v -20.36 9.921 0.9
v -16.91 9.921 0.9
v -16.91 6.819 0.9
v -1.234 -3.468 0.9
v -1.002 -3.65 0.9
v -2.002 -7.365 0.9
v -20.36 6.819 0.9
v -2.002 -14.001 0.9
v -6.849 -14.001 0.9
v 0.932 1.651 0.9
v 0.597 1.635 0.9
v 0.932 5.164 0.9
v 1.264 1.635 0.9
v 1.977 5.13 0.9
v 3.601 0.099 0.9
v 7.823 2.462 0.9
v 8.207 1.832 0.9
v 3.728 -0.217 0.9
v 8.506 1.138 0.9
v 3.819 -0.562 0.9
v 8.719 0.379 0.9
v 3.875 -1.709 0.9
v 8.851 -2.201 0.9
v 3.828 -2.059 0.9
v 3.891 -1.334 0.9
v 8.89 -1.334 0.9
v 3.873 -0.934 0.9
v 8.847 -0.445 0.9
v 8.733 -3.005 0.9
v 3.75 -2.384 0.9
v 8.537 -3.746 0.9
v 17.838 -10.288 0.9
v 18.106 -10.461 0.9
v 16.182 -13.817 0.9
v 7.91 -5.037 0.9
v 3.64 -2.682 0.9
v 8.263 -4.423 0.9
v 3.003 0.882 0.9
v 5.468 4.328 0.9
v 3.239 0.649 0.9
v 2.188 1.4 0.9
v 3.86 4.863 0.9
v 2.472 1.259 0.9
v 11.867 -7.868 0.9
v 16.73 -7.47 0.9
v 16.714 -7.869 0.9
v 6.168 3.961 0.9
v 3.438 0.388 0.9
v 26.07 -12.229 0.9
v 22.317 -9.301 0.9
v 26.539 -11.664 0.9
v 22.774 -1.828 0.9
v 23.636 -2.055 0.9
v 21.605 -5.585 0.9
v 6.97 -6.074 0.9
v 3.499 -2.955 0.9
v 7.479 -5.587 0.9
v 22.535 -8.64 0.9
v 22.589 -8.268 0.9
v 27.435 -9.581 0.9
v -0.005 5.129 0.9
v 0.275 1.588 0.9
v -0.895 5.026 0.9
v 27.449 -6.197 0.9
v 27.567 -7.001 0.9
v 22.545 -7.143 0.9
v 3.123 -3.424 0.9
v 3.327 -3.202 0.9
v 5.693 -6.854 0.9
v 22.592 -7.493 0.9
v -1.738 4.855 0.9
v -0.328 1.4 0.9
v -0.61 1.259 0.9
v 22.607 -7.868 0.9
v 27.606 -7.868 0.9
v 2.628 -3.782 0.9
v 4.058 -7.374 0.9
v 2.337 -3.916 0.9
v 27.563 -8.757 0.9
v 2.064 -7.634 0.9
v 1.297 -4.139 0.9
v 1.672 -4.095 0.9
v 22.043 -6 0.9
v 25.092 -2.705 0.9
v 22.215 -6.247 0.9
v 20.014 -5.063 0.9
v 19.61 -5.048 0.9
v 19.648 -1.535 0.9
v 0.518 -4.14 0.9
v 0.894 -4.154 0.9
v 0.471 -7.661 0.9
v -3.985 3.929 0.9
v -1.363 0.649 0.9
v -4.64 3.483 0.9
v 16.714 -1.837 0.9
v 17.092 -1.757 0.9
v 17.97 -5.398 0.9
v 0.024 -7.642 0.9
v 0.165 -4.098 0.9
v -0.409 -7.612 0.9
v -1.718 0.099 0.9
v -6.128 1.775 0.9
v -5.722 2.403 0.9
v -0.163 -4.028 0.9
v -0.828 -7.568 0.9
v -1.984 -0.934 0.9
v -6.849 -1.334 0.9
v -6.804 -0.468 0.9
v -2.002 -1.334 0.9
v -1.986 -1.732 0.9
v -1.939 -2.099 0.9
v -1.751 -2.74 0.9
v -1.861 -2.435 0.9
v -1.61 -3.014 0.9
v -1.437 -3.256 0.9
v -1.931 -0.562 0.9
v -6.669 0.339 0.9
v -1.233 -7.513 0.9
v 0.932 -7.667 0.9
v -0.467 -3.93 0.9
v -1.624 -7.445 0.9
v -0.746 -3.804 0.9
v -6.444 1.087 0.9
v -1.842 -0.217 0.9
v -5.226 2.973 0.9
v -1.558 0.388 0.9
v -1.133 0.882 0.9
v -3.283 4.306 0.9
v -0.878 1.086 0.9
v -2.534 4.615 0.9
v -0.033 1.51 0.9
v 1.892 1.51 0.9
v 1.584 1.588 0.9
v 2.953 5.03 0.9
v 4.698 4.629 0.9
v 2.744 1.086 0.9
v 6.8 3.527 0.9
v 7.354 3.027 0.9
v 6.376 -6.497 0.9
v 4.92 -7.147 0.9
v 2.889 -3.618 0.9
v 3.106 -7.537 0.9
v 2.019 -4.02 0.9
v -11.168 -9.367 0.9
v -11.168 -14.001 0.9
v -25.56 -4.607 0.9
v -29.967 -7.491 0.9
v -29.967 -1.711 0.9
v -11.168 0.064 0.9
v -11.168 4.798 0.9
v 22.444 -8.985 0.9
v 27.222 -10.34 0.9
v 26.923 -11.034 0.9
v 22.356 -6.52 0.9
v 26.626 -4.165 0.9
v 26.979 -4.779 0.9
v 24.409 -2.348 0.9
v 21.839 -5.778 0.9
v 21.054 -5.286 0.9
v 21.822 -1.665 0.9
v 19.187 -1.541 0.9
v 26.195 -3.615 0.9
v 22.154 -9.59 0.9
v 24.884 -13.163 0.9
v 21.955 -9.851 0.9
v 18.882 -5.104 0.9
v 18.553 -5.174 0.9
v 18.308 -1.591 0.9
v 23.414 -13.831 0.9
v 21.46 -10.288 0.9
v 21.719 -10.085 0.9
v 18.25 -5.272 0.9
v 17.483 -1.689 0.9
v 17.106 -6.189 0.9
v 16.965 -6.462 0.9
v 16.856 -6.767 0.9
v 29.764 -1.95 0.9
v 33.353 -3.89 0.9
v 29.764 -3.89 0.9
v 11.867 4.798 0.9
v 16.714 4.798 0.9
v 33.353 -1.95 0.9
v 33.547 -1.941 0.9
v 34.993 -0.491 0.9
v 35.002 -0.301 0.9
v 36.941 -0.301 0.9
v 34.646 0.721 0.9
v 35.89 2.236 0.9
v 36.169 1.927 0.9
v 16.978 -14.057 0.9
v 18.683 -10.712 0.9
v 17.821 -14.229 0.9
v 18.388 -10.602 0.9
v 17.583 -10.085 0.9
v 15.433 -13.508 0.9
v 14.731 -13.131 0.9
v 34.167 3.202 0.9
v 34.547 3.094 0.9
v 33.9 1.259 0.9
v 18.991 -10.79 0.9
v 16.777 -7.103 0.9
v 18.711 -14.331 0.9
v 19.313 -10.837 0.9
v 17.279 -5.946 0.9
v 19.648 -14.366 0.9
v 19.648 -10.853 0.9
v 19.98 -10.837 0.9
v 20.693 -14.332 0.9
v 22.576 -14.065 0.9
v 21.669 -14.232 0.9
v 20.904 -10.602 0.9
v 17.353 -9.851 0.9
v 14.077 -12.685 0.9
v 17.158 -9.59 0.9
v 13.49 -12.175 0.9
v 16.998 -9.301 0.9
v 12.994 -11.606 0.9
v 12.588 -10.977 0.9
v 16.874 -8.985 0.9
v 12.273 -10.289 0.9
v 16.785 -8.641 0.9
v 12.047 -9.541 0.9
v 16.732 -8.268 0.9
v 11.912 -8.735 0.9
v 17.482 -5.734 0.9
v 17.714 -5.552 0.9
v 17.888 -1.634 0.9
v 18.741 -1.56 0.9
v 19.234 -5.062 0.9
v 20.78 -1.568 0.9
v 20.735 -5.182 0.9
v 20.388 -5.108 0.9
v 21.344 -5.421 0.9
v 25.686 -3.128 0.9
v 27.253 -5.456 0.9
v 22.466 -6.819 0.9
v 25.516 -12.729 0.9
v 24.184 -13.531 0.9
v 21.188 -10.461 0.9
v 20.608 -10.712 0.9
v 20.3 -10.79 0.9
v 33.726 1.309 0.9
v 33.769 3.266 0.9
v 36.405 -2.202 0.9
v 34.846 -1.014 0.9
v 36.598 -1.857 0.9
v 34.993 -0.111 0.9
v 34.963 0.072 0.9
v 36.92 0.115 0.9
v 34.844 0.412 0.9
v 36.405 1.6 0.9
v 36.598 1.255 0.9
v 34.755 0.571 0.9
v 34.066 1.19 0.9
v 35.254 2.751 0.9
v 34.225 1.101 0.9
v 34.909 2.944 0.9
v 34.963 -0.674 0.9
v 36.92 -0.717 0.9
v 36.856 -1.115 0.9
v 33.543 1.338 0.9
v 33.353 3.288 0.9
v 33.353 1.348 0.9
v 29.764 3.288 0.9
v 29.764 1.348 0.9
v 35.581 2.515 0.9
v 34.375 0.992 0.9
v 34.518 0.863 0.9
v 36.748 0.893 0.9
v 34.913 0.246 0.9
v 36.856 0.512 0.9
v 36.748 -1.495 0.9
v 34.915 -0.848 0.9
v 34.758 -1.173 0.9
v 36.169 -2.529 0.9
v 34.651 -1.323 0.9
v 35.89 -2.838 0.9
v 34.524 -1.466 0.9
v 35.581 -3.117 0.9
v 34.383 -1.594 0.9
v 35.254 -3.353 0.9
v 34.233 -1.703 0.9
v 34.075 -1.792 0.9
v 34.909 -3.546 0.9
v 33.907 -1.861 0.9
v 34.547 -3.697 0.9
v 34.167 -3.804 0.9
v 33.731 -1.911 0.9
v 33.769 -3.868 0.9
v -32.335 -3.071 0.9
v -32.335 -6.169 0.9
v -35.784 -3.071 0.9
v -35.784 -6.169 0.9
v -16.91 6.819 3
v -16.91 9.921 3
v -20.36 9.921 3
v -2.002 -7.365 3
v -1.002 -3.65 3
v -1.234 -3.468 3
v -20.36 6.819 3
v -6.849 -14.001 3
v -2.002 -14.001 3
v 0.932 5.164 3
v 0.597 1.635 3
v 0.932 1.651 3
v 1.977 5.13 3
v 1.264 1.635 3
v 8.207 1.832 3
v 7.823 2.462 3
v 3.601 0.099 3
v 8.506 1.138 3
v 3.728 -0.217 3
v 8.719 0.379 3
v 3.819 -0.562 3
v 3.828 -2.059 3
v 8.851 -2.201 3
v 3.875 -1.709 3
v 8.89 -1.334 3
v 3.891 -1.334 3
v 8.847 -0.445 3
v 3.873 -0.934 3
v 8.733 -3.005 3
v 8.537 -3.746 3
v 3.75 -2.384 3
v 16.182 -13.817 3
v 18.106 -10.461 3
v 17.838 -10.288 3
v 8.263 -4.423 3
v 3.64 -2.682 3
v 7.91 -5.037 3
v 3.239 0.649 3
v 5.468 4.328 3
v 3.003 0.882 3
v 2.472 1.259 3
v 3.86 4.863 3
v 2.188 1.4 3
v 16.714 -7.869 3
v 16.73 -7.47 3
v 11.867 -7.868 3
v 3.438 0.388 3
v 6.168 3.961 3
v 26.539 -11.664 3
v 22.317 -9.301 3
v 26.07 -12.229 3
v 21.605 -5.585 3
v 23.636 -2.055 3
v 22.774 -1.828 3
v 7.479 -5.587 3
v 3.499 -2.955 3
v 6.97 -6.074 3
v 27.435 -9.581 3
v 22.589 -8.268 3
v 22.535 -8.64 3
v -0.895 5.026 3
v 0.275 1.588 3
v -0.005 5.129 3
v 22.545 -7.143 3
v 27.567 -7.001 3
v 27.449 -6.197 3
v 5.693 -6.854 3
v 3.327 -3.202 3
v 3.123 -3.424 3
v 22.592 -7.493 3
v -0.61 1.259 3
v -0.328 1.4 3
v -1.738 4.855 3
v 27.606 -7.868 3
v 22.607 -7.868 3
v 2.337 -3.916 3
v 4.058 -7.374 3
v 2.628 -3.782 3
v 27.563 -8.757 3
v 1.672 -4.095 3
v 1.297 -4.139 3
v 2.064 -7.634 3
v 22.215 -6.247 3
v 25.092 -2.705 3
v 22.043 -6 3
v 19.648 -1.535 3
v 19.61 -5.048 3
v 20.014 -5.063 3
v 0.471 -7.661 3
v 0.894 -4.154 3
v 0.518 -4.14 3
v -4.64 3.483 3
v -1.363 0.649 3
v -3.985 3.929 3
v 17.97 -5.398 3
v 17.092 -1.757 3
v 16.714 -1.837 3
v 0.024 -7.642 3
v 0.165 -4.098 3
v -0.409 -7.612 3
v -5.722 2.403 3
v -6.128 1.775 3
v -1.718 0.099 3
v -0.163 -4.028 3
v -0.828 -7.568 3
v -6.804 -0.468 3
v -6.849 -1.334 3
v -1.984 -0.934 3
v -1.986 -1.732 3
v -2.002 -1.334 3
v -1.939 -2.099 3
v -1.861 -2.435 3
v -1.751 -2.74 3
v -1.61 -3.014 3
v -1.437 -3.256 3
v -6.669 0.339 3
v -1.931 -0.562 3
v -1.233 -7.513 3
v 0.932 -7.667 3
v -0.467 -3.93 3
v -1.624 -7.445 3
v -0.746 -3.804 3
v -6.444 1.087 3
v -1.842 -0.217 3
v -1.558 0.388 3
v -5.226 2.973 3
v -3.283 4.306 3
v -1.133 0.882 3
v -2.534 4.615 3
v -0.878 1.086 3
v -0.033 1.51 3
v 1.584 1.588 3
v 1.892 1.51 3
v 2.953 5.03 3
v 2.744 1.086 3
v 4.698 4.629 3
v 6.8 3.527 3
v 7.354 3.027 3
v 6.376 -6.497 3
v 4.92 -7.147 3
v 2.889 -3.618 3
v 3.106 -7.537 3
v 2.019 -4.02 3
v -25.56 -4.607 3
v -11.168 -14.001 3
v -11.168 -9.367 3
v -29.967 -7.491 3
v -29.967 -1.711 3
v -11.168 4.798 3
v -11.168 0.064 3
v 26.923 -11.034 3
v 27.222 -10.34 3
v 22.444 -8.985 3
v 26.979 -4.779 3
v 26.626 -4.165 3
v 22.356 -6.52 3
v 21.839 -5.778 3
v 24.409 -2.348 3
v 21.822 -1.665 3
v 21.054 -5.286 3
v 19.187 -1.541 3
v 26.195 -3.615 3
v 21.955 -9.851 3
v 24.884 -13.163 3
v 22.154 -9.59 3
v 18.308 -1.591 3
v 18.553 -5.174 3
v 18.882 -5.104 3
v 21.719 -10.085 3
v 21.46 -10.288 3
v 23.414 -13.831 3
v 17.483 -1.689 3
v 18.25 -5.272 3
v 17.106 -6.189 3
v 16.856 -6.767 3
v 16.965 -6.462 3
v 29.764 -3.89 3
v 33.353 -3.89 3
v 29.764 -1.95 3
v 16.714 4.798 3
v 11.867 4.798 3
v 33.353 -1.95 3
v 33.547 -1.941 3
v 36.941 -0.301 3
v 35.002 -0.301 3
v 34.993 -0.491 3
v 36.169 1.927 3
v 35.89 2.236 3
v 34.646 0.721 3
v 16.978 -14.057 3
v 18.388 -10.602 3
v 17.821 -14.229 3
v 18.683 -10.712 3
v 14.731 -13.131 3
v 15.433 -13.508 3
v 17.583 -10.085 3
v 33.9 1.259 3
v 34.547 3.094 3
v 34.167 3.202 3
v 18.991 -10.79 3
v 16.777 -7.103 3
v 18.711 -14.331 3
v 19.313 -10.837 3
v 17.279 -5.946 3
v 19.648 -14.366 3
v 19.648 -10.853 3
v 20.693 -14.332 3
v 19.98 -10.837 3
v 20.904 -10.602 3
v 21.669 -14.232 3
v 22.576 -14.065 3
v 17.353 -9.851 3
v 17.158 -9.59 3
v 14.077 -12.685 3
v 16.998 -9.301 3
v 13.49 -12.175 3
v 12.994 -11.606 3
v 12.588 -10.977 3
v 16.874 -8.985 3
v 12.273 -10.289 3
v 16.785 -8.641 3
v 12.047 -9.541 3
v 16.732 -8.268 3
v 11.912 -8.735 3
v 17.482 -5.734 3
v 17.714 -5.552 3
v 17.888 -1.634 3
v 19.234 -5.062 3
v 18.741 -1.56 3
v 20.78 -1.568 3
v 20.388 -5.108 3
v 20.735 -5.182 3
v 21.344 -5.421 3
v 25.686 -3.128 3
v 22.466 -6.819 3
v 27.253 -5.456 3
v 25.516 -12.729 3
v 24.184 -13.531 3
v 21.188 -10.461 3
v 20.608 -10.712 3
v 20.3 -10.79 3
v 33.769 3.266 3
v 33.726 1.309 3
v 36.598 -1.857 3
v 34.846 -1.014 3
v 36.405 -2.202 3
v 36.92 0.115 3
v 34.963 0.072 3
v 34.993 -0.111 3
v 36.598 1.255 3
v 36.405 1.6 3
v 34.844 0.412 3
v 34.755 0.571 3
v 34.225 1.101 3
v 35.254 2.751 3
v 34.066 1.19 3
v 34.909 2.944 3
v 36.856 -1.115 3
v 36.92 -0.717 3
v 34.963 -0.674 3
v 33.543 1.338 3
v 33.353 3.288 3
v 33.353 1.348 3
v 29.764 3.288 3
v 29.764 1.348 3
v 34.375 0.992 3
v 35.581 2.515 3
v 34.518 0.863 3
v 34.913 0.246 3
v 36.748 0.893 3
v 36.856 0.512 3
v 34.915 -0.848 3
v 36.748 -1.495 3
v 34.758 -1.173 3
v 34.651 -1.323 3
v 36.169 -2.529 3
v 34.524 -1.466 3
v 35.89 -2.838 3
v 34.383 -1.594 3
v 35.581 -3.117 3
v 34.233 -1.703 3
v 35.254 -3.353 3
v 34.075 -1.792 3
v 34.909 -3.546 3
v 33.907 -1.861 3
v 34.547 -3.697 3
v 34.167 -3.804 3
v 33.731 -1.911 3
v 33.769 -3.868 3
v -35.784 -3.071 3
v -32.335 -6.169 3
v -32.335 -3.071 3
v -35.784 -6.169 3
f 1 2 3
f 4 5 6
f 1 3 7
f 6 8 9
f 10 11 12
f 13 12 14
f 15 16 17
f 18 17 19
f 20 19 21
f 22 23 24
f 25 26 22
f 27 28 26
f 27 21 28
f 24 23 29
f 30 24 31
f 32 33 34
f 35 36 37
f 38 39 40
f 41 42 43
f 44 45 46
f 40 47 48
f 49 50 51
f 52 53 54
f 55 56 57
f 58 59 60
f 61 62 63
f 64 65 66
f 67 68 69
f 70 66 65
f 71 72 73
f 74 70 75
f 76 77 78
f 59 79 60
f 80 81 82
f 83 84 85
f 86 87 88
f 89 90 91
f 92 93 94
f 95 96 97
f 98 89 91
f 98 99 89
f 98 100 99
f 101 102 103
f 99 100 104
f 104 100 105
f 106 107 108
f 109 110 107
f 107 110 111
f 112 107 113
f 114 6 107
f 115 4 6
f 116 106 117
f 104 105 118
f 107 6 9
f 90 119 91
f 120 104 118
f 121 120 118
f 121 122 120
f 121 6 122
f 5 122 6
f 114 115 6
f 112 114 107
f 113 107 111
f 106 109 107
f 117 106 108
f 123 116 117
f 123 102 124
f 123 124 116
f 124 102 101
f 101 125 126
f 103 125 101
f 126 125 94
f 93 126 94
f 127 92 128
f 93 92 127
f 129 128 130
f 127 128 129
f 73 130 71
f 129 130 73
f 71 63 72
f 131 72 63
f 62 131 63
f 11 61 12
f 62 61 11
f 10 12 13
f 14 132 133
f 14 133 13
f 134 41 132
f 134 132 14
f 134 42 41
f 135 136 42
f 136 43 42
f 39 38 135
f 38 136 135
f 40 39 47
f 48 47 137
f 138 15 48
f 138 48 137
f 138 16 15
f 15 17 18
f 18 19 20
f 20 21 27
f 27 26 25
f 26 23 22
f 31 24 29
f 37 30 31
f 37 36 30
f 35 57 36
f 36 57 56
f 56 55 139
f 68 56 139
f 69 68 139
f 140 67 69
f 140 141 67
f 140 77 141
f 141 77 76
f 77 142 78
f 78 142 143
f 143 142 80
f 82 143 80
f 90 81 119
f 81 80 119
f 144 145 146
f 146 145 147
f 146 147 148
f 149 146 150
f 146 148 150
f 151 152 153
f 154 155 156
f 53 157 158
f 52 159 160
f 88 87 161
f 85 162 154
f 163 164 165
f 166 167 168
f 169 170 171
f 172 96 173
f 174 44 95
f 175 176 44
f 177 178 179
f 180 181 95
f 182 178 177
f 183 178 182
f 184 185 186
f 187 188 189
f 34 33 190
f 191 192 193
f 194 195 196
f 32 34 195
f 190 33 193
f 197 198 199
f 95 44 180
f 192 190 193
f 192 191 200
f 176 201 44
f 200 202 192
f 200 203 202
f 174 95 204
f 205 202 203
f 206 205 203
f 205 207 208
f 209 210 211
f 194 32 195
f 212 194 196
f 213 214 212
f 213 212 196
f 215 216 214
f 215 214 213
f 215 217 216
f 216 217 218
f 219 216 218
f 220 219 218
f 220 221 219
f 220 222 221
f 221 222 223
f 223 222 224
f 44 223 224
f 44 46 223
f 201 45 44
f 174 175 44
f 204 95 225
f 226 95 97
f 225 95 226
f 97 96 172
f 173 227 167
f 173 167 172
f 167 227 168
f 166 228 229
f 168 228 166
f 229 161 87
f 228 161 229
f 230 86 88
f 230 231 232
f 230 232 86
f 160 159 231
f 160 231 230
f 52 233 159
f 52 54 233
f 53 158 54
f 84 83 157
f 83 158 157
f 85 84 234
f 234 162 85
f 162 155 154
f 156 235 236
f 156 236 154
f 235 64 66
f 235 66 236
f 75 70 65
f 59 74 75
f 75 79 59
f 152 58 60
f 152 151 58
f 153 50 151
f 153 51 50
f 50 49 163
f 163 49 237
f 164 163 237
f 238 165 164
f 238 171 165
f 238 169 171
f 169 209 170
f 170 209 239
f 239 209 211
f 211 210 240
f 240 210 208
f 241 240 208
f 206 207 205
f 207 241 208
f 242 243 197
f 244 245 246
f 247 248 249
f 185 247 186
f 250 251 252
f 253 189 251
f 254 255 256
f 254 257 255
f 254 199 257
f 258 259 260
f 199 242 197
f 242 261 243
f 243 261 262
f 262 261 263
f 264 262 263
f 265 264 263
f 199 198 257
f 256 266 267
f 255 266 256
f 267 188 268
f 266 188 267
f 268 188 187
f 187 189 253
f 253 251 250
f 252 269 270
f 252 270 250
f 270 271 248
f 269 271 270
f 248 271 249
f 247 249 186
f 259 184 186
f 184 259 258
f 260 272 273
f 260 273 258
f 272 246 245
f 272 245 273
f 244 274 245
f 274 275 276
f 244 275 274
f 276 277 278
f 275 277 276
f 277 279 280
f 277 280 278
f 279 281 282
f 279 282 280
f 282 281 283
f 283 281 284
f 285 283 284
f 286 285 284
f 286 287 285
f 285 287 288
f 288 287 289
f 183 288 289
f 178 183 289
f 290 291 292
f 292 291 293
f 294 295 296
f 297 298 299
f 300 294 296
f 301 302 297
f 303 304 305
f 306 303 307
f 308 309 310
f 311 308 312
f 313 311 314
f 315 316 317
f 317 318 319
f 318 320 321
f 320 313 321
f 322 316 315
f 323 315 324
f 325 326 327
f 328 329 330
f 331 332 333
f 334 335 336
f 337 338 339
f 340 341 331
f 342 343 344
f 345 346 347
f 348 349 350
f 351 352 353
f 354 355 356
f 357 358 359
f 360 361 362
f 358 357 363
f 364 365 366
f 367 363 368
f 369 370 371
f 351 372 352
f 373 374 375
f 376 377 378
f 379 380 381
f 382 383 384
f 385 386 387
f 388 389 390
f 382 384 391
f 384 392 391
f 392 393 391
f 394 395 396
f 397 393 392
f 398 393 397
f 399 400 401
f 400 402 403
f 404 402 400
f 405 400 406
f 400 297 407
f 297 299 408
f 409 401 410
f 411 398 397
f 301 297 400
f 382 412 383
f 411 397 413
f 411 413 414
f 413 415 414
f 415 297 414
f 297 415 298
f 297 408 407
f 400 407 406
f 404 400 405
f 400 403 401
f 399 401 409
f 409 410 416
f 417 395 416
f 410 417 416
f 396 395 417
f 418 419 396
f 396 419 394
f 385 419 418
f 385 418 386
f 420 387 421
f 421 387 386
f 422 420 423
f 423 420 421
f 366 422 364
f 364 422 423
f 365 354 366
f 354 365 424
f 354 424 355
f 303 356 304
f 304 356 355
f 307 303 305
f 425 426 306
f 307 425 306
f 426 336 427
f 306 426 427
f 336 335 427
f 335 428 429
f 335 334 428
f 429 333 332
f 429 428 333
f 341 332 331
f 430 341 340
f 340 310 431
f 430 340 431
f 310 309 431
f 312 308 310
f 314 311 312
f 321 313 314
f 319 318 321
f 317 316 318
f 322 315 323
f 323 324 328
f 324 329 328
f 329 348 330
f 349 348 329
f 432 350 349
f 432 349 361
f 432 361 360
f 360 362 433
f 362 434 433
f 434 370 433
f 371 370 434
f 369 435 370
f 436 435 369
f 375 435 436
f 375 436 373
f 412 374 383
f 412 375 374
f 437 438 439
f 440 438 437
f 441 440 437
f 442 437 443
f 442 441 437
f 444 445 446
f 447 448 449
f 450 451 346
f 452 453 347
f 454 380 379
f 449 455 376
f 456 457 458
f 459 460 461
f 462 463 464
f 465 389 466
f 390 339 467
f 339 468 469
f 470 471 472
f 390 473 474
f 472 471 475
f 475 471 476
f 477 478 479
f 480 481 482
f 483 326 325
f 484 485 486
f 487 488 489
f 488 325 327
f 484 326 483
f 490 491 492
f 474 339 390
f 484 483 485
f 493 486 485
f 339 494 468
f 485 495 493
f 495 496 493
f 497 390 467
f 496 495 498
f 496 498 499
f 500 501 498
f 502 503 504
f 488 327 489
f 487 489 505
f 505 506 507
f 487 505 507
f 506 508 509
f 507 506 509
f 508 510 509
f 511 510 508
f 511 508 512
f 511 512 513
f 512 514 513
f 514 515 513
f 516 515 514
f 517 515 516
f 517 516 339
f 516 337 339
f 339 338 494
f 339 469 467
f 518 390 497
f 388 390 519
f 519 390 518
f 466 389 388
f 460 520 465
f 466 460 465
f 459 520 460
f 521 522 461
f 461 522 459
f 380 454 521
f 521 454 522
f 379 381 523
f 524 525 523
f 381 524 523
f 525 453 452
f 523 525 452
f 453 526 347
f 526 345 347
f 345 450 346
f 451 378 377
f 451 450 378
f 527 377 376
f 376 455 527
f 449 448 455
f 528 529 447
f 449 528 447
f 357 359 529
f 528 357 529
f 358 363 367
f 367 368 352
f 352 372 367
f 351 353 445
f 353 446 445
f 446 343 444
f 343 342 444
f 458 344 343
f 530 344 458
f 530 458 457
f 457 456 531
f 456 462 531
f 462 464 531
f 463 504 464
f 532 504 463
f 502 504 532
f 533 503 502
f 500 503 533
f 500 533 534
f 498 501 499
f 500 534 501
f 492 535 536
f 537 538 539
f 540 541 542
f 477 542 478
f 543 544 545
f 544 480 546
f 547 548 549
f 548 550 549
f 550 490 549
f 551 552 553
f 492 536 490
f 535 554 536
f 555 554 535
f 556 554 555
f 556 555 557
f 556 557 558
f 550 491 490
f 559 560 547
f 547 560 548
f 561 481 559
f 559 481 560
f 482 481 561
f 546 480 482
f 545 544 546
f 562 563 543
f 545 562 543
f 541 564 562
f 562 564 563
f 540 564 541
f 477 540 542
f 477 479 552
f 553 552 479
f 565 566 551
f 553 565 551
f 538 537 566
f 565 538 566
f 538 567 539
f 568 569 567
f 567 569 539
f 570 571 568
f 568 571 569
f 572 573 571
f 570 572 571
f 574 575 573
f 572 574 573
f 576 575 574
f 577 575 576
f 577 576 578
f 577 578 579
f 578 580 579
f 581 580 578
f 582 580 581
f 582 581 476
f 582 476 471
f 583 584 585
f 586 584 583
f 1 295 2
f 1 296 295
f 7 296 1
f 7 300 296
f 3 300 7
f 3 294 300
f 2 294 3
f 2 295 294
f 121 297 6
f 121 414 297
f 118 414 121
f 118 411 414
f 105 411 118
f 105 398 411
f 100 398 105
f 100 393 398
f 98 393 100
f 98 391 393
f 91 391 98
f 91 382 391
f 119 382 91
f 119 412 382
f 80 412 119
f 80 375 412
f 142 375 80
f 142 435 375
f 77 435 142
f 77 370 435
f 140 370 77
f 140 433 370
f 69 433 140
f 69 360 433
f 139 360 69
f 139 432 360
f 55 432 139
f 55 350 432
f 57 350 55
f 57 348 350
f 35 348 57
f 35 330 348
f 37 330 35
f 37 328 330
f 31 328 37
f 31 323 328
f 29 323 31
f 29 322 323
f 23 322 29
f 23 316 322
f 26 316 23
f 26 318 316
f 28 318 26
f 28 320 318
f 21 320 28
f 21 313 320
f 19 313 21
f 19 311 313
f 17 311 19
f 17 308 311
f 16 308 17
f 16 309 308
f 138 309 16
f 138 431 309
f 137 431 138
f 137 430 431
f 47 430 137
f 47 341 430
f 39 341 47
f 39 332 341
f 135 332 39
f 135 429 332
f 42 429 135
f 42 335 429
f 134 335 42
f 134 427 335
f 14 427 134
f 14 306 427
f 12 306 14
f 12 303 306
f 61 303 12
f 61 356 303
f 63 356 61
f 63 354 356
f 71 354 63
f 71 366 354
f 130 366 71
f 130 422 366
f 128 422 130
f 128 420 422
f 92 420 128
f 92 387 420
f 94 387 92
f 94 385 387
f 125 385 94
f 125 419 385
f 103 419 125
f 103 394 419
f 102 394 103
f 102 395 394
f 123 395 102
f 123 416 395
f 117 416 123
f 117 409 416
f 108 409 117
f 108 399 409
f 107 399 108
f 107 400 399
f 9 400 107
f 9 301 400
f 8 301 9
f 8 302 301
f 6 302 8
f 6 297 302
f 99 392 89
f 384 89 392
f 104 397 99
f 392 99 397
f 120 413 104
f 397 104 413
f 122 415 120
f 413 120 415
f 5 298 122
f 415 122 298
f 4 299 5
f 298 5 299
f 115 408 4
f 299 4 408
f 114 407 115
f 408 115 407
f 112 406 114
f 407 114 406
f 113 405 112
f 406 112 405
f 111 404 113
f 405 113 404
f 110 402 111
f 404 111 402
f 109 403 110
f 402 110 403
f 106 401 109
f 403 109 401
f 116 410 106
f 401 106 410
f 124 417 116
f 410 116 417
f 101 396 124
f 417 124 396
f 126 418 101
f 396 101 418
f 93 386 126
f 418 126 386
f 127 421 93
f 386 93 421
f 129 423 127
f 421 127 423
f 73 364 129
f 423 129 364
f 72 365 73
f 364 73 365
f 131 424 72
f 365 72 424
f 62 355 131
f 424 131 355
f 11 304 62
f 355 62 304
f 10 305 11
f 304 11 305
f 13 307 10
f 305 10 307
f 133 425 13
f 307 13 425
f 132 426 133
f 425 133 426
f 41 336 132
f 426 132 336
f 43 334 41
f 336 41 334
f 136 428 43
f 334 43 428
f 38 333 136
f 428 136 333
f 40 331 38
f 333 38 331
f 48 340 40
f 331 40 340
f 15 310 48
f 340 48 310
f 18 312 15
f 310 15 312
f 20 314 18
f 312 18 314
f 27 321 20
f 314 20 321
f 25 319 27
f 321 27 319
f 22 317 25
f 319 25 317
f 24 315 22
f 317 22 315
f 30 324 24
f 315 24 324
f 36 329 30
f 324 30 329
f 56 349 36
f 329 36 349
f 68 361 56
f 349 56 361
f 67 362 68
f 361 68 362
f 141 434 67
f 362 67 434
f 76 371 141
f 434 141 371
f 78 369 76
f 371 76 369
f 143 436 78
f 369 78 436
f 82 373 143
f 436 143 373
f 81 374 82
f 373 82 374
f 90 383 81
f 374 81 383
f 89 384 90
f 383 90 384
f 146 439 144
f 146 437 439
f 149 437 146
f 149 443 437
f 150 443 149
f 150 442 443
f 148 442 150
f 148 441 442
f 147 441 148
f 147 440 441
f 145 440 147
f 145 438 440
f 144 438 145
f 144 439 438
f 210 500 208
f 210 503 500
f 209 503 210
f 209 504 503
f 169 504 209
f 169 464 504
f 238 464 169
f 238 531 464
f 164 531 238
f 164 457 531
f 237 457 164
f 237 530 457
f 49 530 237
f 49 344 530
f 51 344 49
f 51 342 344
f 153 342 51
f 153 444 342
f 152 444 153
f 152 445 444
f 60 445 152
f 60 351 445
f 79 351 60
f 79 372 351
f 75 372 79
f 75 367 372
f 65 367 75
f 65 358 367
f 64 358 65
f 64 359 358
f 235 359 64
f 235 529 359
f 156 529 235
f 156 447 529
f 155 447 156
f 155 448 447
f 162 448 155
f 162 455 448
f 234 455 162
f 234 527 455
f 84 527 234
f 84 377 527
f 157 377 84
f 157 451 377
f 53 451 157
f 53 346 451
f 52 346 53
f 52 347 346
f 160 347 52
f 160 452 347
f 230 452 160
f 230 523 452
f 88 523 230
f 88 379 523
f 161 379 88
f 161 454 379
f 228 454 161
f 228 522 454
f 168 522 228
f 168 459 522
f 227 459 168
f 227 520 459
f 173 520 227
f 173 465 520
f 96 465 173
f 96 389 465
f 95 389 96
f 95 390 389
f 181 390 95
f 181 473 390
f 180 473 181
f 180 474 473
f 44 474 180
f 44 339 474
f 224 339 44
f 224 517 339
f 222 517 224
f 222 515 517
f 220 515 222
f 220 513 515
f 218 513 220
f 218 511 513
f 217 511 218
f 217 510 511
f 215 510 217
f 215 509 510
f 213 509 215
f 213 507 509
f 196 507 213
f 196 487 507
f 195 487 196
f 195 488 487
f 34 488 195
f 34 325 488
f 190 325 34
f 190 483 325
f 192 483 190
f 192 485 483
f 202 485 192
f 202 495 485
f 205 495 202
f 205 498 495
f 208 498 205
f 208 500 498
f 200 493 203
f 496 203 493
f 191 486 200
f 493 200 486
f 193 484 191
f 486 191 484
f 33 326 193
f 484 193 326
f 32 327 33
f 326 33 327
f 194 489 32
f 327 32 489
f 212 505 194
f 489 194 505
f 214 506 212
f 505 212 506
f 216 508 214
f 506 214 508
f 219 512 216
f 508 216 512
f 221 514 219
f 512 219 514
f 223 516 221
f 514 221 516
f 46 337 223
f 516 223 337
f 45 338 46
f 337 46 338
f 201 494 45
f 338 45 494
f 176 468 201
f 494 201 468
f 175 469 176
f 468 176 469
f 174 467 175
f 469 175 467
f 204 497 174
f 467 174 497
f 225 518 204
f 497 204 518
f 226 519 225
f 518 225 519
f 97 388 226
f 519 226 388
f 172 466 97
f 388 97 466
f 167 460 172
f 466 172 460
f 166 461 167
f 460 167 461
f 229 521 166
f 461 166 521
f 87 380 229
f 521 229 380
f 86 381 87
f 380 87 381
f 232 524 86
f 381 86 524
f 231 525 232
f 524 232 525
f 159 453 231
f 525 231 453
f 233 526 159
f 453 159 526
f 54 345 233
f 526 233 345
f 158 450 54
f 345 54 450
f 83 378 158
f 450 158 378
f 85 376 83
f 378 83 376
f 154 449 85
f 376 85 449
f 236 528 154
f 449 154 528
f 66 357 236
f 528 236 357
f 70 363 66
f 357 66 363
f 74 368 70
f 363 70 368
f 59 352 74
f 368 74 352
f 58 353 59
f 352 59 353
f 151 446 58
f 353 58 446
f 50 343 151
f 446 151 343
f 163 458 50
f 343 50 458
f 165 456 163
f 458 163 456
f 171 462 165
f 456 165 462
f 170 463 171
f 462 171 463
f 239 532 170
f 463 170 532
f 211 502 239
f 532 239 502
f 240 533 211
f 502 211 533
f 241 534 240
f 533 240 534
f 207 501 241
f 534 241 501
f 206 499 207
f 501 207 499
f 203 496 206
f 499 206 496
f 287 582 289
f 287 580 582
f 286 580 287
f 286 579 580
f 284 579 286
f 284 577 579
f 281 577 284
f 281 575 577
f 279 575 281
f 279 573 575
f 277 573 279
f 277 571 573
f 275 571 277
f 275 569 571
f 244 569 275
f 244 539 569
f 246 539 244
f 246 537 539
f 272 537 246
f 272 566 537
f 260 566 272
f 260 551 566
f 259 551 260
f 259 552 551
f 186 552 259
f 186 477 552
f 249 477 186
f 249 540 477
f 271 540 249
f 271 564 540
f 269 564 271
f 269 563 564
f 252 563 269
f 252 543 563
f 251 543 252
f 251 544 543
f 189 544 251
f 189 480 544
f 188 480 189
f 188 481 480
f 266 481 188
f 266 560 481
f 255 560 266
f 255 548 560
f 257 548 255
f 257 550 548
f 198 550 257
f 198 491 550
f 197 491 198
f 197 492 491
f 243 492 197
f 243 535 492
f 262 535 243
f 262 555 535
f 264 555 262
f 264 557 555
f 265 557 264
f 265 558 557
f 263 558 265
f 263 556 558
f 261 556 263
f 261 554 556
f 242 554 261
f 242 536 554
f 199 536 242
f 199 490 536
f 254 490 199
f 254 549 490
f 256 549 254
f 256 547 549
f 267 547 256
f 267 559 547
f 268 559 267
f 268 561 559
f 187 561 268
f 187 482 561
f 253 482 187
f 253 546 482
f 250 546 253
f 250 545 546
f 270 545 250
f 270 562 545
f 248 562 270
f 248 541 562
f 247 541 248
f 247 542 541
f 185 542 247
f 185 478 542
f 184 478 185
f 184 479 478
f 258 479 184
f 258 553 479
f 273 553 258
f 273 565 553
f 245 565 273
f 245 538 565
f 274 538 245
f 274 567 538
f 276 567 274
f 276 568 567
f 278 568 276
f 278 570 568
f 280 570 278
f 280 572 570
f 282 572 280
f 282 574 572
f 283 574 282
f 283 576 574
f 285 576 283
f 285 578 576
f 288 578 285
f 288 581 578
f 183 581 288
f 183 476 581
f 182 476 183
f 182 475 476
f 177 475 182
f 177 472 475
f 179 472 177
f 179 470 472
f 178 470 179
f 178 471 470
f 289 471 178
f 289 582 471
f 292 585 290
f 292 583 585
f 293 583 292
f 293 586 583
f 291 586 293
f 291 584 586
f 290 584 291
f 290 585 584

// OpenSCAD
$fn = 48;
  // syllabics (overlaid on icon, tallest)
  translate([0, -2.500, 0.900]) linear_extrude(height=2.100) text("ᑆᑭᑲᐣ", size=18.568, halign="center", valign="center", font="Euphemia UCAS:style=Bold");
